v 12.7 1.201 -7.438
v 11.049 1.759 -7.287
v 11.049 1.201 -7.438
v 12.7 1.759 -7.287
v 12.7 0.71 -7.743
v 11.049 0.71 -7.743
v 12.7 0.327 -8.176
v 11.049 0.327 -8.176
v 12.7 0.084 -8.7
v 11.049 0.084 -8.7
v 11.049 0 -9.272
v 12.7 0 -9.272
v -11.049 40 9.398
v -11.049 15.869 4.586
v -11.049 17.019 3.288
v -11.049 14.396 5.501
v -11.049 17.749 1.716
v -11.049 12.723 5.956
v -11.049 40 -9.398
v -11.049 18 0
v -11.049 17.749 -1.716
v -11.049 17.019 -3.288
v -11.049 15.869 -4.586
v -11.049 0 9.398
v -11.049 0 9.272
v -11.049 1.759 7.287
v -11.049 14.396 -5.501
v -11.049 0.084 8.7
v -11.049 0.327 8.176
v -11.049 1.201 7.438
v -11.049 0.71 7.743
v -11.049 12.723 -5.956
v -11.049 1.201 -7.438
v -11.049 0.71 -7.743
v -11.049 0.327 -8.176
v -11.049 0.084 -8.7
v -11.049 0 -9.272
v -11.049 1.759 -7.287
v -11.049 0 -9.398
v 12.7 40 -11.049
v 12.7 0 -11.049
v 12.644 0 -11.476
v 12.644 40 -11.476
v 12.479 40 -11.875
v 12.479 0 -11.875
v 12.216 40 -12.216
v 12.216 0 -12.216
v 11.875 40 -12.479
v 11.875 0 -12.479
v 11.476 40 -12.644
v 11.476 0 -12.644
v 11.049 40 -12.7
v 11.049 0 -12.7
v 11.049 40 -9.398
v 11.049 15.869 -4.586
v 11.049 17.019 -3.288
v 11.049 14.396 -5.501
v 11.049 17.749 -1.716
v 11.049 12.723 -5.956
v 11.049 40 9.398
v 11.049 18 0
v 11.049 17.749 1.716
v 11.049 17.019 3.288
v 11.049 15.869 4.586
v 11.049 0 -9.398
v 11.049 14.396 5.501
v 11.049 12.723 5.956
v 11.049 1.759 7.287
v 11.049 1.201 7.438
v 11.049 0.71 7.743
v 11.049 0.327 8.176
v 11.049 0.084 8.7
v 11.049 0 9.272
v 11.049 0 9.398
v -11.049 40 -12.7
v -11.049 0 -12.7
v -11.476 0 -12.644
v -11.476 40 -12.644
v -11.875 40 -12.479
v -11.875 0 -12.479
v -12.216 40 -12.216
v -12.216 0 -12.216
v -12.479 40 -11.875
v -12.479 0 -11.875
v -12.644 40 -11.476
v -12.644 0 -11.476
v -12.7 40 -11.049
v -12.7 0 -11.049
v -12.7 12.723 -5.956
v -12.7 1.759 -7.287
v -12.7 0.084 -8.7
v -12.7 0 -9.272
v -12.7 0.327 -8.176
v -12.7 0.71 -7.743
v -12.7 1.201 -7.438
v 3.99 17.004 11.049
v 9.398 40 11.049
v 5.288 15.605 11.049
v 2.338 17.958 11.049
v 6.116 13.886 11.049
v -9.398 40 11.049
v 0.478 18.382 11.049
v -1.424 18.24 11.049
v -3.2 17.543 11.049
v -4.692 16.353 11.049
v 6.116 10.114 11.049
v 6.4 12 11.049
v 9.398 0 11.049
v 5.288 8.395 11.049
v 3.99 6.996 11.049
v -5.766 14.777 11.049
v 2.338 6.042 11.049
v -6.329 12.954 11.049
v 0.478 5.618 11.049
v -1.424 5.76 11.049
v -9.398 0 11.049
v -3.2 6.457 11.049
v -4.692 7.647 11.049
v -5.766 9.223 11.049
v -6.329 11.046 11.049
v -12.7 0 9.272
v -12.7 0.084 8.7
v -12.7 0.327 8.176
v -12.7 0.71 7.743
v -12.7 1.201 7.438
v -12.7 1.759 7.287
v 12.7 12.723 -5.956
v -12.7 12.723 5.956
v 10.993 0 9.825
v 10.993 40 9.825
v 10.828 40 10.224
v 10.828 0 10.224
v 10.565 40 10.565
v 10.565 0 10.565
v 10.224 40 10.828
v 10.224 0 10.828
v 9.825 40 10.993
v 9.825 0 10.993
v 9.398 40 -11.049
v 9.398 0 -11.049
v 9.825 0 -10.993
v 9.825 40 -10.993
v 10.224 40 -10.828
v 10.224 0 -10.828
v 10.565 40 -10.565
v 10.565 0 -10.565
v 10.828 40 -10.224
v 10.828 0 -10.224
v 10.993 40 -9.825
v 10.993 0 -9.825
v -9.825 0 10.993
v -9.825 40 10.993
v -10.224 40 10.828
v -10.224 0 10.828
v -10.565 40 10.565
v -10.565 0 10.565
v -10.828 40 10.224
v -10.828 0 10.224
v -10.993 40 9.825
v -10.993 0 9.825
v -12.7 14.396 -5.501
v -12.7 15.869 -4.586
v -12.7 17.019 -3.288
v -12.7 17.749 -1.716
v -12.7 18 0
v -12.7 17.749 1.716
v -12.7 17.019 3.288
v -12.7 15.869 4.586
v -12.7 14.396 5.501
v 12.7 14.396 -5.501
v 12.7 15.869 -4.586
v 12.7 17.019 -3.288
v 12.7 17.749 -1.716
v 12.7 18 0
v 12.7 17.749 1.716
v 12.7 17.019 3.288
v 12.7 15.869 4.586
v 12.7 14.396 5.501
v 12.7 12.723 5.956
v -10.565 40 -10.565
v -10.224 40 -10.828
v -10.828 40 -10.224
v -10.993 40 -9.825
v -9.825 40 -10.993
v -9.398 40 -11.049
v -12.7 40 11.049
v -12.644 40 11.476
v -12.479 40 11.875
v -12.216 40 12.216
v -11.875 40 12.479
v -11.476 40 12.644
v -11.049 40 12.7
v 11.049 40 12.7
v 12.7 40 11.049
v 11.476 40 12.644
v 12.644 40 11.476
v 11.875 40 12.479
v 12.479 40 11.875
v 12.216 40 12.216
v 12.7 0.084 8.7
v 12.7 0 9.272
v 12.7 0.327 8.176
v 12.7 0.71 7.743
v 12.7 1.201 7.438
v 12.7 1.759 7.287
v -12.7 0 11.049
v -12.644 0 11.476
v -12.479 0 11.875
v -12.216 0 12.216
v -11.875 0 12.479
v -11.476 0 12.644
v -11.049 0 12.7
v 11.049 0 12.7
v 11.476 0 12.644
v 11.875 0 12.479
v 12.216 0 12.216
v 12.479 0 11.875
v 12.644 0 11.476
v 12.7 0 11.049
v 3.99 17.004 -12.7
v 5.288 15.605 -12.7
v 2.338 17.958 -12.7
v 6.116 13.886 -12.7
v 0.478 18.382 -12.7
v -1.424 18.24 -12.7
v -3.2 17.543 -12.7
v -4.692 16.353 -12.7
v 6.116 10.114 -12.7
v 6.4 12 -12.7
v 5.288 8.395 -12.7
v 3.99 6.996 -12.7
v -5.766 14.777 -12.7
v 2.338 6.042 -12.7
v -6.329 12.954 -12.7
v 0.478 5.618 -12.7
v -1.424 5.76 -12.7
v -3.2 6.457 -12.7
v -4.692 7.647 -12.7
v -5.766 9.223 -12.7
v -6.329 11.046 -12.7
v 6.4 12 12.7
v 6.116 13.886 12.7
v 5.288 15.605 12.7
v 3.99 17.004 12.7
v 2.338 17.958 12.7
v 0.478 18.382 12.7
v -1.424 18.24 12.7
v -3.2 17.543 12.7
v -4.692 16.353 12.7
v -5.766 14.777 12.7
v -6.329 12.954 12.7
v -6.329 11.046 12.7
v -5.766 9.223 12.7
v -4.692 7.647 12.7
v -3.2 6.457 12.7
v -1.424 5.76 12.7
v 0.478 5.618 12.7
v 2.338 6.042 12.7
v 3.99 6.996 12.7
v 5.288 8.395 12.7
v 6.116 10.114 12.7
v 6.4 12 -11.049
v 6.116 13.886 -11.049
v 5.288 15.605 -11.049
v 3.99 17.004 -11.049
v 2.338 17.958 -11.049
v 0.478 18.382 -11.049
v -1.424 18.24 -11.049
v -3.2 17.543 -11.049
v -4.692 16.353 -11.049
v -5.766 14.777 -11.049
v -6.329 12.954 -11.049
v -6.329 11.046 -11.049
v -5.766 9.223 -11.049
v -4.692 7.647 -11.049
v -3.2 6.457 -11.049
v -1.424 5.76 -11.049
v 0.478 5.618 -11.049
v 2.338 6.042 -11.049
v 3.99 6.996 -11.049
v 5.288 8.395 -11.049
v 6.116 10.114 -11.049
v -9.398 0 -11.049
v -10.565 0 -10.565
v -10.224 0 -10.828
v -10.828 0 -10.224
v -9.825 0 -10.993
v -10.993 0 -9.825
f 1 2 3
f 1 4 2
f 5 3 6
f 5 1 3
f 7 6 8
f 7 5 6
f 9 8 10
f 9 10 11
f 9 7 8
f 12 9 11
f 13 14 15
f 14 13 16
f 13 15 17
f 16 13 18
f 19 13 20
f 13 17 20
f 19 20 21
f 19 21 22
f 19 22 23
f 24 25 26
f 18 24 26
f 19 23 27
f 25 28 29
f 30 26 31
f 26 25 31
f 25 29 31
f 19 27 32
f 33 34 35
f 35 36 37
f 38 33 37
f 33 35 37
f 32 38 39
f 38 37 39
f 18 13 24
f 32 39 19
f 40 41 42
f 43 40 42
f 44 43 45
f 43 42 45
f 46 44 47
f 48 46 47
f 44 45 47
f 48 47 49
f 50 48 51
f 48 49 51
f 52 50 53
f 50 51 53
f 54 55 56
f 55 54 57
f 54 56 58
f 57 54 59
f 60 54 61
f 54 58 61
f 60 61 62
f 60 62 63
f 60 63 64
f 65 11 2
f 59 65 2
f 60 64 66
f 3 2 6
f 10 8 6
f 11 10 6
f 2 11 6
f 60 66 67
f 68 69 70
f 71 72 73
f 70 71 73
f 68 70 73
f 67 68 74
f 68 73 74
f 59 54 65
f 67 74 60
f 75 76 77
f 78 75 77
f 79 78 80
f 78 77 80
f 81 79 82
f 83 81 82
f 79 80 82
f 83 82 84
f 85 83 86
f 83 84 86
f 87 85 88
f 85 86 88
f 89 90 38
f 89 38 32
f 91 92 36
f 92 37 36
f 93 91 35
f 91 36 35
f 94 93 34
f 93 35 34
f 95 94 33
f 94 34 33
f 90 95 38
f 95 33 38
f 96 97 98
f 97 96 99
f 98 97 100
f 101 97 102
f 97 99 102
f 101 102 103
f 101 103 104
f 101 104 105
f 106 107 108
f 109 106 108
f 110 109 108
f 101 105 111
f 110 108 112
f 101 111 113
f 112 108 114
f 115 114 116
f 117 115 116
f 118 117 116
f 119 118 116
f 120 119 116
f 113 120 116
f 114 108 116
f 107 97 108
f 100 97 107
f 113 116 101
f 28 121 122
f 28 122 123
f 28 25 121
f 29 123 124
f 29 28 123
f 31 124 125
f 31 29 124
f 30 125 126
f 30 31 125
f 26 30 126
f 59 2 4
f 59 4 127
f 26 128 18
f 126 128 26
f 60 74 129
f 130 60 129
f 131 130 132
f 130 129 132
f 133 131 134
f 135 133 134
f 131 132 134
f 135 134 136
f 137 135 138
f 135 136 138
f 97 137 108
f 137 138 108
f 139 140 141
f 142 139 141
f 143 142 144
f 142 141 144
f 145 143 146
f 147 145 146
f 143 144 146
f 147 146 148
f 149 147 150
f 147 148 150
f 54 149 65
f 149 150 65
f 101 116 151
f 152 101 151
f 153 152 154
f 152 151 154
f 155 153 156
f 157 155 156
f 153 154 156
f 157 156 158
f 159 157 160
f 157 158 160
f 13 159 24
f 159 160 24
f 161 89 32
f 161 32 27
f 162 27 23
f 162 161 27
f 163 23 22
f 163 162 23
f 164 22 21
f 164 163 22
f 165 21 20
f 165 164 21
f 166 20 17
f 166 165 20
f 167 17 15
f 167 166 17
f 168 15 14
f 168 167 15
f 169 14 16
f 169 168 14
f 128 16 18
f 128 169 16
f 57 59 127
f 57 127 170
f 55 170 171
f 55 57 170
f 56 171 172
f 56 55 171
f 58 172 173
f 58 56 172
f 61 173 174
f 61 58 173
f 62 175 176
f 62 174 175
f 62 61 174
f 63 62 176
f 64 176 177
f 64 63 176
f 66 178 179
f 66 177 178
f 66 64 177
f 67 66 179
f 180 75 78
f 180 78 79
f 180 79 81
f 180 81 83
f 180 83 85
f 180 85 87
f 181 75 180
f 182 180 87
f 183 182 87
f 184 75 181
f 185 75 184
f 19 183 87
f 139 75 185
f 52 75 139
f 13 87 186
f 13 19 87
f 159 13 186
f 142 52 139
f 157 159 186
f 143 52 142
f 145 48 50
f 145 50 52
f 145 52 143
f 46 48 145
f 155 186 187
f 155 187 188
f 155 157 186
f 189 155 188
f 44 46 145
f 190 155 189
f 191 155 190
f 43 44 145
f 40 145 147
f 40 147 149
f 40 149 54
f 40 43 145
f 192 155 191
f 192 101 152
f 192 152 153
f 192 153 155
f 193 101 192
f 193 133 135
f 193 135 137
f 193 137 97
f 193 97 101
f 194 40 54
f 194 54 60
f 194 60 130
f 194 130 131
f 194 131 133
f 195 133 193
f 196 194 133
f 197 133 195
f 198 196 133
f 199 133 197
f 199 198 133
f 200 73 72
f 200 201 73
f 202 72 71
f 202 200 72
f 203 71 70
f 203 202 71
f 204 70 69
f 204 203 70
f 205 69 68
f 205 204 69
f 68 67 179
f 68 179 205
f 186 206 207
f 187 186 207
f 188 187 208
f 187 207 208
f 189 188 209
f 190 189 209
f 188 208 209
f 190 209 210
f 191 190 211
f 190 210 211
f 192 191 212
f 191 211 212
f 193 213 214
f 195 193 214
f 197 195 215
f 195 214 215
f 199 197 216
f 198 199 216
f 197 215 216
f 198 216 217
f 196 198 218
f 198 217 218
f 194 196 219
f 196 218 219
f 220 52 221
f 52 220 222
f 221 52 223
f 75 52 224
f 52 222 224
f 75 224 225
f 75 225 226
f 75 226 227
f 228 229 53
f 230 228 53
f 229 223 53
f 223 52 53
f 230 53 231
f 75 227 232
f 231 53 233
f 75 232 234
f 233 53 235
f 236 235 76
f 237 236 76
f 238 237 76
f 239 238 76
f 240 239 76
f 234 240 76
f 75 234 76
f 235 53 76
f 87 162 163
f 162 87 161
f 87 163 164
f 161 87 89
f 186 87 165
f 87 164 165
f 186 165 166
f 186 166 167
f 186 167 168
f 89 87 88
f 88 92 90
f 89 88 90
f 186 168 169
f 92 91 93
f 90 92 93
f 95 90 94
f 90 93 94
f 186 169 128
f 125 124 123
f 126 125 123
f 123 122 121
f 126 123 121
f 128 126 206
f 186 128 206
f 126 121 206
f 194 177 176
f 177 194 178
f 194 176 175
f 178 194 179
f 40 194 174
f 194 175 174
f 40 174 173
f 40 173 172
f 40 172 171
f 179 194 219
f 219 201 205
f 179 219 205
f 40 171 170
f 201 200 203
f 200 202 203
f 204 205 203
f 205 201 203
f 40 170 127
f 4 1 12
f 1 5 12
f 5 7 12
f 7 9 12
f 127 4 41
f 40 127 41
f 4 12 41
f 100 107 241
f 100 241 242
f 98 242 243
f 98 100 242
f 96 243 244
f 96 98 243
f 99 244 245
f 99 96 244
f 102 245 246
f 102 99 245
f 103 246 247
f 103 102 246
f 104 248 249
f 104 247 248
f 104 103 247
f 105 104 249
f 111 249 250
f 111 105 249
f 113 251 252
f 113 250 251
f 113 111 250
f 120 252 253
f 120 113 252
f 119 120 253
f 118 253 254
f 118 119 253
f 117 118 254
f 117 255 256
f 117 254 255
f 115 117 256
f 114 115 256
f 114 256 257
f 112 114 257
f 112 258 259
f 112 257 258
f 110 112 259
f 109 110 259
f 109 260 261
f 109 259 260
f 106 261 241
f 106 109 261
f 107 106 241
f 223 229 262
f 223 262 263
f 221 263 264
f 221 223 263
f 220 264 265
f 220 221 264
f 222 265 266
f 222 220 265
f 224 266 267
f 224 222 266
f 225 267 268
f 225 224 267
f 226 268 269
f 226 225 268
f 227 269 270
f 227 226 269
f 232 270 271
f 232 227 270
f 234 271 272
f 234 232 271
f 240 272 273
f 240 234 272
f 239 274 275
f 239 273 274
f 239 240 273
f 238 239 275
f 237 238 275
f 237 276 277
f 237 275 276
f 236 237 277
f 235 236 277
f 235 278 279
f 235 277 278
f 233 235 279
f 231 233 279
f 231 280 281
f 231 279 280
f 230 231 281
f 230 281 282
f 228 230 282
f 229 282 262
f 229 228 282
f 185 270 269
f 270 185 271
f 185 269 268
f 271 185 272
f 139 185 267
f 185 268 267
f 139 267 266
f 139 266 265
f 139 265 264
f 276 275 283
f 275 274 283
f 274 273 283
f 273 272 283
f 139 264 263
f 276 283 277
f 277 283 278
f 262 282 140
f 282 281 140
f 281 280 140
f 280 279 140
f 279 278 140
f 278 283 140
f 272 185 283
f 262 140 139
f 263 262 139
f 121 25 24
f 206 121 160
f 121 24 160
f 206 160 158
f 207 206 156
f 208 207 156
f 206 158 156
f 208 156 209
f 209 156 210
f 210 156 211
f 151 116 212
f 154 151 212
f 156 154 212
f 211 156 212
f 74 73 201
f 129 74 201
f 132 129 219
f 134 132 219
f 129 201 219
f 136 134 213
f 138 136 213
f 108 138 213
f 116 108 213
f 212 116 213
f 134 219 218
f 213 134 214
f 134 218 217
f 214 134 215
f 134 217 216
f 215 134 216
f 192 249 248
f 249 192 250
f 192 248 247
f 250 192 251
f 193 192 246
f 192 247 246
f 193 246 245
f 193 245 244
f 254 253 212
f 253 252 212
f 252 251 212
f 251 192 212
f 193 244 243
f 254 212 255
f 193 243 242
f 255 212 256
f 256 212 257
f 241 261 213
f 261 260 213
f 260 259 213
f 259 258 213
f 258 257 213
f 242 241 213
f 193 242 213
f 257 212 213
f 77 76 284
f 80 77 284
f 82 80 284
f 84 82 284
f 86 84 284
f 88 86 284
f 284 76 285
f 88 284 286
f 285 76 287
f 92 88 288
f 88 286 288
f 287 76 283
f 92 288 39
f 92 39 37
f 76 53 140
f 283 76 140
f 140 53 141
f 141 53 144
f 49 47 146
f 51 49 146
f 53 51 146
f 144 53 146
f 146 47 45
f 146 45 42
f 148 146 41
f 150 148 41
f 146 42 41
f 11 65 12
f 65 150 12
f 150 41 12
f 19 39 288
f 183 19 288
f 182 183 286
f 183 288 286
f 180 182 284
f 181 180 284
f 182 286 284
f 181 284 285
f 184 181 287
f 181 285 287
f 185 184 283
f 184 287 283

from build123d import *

# Parameters (mm, degrees)
FSAE_CHASSIS_MCMASTER_4130_1IN_X_065IN_DEPTH = 40
CUT_EXTRUDE1_DEPTH                           = 50.055580722
CUT_EXTRUDE1_DEPTH_BACK                      = 50.055580722
SKETCH3_R                                    = 6.4
CUT_EXTRUDE2_DEPTH                           = 50.055580722
CUT_EXTRUDE2_DEPTH_BACK                      = 50.055580722
FILLET1_R                                    = 2


with BuildPart() as part:
    # Sketch2 → Fsae chassis MCMASTER 4130 1IN X .065IN SQUARE STOCK(1) (new body)
    with BuildSketch(Plane.ZX):
        with BuildLine():
            Line((11.049, 12.7), (-11.049, 12.7))
            ThreePointArc((-11.049, 12.7), (-12.216433296, 12.216433296), (-12.7, 11.049))
            Line((-12.7, 11.049), (-12.7, -11.049))
            ThreePointArc((-12.7, -11.049), (-12.216433296, -12.216433296), (-11.049, -12.7))
            Line((-11.049, -12.7), (11.049, -12.7))
            ThreePointArc((11.049, -12.7), (12.216433296, -12.216433296), (12.7, -11.049))
            Line((12.7, -11.049), (12.7, 11.049))
            ThreePointArc((12.7, 11.049), (12.216433296, 12.216433296), (11.049, 12.7))
        make_face()
        with BuildLine():
            Line((-9.398, 11.049), (9.398, 11.049))
            ThreePointArc((9.398, 11.049), (10.565433296, 10.565433296), (11.049, 9.398))
            Line((11.049, 9.398), (11.049, -9.398))
            ThreePointArc((11.049, -9.398), (10.565433296, -10.565433296), (9.398, -11.049))
            Line((9.398, -11.049), (-9.398, -11.049))
            ThreePointArc((-9.398, -11.049), (-10.565433296, -10.565433296), (-11.049, -9.398))
            Line((-11.049, -9.398), (-11.049, 9.398))
            ThreePointArc((-11.049, 9.398), (-10.565433296, 10.565433296), (-9.398, 11.049))
        make_face(mode=Mode.SUBTRACT)
    extrude(amount=FSAE_CHASSIS_MCMASTER_4130_1IN_X_065IN_DEPTH)

    # Sketch3 → Cut-Extrude1 (cut, two sides: drawn at the far end of the back side and taken through both)
    with BuildSketch(Plane.XY.offset(12.7).offset(-CUT_EXTRUDE1_DEPTH_BACK)):
        with Locations((0, 12)):
            Circle(SKETCH3_R)
    extrude(amount=CUT_EXTRUDE1_DEPTH + CUT_EXTRUDE1_DEPTH_BACK, mode=Mode.SUBTRACT)

    # Sketch4 → Cut-Extrude2 (cut, two sides: drawn at the far end of the back side and taken through both)
    with BuildSketch(Plane(origin=(12.7, 0, 0), x_dir=(0, 0, -1), z_dir=(1, 0, 0)).offset(-CUT_EXTRUDE2_DEPTH_BACK)):
        with BuildLine():
            Line((-7.5, 0), (7.5, 0))
            Line((7.5, 0), (5.956316627, 12.722697892))
            ThreePointArc((5.956316627, 12.722697892), (0, 18), (-5.956316627, 12.722697892))
            Line((-5.956316627, 12.722697892), (-7.5, 0))
        make_face()
    extrude(amount=CUT_EXTRUDE2_DEPTH + CUT_EXTRUDE2_DEPTH_BACK, mode=Mode.SUBTRACT)

    # Fillet1
    fillet1_edges = [part.edges().sort_by_distance(p)[0] for p in [
        (11.8745, 0, 7.5),
        (11.8745, 0, -7.5),
        (-11.8745, 0, -7.5),
        (-11.8745, 0, 7.5),
    ]]
    fillet(fillet1_edges, radius=FILLET1_R)


solid = part.part
